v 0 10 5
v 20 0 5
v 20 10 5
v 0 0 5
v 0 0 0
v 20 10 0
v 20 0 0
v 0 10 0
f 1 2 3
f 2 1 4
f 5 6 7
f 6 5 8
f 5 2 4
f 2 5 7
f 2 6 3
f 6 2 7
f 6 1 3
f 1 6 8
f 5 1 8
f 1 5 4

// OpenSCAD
// Wall Block in OpenSCAD

$fn = 32;

module wall_block(width, height, depth) {
  cube([width, height, depth]);
}

// Example usage:
wall_block(20, 10, 5);
